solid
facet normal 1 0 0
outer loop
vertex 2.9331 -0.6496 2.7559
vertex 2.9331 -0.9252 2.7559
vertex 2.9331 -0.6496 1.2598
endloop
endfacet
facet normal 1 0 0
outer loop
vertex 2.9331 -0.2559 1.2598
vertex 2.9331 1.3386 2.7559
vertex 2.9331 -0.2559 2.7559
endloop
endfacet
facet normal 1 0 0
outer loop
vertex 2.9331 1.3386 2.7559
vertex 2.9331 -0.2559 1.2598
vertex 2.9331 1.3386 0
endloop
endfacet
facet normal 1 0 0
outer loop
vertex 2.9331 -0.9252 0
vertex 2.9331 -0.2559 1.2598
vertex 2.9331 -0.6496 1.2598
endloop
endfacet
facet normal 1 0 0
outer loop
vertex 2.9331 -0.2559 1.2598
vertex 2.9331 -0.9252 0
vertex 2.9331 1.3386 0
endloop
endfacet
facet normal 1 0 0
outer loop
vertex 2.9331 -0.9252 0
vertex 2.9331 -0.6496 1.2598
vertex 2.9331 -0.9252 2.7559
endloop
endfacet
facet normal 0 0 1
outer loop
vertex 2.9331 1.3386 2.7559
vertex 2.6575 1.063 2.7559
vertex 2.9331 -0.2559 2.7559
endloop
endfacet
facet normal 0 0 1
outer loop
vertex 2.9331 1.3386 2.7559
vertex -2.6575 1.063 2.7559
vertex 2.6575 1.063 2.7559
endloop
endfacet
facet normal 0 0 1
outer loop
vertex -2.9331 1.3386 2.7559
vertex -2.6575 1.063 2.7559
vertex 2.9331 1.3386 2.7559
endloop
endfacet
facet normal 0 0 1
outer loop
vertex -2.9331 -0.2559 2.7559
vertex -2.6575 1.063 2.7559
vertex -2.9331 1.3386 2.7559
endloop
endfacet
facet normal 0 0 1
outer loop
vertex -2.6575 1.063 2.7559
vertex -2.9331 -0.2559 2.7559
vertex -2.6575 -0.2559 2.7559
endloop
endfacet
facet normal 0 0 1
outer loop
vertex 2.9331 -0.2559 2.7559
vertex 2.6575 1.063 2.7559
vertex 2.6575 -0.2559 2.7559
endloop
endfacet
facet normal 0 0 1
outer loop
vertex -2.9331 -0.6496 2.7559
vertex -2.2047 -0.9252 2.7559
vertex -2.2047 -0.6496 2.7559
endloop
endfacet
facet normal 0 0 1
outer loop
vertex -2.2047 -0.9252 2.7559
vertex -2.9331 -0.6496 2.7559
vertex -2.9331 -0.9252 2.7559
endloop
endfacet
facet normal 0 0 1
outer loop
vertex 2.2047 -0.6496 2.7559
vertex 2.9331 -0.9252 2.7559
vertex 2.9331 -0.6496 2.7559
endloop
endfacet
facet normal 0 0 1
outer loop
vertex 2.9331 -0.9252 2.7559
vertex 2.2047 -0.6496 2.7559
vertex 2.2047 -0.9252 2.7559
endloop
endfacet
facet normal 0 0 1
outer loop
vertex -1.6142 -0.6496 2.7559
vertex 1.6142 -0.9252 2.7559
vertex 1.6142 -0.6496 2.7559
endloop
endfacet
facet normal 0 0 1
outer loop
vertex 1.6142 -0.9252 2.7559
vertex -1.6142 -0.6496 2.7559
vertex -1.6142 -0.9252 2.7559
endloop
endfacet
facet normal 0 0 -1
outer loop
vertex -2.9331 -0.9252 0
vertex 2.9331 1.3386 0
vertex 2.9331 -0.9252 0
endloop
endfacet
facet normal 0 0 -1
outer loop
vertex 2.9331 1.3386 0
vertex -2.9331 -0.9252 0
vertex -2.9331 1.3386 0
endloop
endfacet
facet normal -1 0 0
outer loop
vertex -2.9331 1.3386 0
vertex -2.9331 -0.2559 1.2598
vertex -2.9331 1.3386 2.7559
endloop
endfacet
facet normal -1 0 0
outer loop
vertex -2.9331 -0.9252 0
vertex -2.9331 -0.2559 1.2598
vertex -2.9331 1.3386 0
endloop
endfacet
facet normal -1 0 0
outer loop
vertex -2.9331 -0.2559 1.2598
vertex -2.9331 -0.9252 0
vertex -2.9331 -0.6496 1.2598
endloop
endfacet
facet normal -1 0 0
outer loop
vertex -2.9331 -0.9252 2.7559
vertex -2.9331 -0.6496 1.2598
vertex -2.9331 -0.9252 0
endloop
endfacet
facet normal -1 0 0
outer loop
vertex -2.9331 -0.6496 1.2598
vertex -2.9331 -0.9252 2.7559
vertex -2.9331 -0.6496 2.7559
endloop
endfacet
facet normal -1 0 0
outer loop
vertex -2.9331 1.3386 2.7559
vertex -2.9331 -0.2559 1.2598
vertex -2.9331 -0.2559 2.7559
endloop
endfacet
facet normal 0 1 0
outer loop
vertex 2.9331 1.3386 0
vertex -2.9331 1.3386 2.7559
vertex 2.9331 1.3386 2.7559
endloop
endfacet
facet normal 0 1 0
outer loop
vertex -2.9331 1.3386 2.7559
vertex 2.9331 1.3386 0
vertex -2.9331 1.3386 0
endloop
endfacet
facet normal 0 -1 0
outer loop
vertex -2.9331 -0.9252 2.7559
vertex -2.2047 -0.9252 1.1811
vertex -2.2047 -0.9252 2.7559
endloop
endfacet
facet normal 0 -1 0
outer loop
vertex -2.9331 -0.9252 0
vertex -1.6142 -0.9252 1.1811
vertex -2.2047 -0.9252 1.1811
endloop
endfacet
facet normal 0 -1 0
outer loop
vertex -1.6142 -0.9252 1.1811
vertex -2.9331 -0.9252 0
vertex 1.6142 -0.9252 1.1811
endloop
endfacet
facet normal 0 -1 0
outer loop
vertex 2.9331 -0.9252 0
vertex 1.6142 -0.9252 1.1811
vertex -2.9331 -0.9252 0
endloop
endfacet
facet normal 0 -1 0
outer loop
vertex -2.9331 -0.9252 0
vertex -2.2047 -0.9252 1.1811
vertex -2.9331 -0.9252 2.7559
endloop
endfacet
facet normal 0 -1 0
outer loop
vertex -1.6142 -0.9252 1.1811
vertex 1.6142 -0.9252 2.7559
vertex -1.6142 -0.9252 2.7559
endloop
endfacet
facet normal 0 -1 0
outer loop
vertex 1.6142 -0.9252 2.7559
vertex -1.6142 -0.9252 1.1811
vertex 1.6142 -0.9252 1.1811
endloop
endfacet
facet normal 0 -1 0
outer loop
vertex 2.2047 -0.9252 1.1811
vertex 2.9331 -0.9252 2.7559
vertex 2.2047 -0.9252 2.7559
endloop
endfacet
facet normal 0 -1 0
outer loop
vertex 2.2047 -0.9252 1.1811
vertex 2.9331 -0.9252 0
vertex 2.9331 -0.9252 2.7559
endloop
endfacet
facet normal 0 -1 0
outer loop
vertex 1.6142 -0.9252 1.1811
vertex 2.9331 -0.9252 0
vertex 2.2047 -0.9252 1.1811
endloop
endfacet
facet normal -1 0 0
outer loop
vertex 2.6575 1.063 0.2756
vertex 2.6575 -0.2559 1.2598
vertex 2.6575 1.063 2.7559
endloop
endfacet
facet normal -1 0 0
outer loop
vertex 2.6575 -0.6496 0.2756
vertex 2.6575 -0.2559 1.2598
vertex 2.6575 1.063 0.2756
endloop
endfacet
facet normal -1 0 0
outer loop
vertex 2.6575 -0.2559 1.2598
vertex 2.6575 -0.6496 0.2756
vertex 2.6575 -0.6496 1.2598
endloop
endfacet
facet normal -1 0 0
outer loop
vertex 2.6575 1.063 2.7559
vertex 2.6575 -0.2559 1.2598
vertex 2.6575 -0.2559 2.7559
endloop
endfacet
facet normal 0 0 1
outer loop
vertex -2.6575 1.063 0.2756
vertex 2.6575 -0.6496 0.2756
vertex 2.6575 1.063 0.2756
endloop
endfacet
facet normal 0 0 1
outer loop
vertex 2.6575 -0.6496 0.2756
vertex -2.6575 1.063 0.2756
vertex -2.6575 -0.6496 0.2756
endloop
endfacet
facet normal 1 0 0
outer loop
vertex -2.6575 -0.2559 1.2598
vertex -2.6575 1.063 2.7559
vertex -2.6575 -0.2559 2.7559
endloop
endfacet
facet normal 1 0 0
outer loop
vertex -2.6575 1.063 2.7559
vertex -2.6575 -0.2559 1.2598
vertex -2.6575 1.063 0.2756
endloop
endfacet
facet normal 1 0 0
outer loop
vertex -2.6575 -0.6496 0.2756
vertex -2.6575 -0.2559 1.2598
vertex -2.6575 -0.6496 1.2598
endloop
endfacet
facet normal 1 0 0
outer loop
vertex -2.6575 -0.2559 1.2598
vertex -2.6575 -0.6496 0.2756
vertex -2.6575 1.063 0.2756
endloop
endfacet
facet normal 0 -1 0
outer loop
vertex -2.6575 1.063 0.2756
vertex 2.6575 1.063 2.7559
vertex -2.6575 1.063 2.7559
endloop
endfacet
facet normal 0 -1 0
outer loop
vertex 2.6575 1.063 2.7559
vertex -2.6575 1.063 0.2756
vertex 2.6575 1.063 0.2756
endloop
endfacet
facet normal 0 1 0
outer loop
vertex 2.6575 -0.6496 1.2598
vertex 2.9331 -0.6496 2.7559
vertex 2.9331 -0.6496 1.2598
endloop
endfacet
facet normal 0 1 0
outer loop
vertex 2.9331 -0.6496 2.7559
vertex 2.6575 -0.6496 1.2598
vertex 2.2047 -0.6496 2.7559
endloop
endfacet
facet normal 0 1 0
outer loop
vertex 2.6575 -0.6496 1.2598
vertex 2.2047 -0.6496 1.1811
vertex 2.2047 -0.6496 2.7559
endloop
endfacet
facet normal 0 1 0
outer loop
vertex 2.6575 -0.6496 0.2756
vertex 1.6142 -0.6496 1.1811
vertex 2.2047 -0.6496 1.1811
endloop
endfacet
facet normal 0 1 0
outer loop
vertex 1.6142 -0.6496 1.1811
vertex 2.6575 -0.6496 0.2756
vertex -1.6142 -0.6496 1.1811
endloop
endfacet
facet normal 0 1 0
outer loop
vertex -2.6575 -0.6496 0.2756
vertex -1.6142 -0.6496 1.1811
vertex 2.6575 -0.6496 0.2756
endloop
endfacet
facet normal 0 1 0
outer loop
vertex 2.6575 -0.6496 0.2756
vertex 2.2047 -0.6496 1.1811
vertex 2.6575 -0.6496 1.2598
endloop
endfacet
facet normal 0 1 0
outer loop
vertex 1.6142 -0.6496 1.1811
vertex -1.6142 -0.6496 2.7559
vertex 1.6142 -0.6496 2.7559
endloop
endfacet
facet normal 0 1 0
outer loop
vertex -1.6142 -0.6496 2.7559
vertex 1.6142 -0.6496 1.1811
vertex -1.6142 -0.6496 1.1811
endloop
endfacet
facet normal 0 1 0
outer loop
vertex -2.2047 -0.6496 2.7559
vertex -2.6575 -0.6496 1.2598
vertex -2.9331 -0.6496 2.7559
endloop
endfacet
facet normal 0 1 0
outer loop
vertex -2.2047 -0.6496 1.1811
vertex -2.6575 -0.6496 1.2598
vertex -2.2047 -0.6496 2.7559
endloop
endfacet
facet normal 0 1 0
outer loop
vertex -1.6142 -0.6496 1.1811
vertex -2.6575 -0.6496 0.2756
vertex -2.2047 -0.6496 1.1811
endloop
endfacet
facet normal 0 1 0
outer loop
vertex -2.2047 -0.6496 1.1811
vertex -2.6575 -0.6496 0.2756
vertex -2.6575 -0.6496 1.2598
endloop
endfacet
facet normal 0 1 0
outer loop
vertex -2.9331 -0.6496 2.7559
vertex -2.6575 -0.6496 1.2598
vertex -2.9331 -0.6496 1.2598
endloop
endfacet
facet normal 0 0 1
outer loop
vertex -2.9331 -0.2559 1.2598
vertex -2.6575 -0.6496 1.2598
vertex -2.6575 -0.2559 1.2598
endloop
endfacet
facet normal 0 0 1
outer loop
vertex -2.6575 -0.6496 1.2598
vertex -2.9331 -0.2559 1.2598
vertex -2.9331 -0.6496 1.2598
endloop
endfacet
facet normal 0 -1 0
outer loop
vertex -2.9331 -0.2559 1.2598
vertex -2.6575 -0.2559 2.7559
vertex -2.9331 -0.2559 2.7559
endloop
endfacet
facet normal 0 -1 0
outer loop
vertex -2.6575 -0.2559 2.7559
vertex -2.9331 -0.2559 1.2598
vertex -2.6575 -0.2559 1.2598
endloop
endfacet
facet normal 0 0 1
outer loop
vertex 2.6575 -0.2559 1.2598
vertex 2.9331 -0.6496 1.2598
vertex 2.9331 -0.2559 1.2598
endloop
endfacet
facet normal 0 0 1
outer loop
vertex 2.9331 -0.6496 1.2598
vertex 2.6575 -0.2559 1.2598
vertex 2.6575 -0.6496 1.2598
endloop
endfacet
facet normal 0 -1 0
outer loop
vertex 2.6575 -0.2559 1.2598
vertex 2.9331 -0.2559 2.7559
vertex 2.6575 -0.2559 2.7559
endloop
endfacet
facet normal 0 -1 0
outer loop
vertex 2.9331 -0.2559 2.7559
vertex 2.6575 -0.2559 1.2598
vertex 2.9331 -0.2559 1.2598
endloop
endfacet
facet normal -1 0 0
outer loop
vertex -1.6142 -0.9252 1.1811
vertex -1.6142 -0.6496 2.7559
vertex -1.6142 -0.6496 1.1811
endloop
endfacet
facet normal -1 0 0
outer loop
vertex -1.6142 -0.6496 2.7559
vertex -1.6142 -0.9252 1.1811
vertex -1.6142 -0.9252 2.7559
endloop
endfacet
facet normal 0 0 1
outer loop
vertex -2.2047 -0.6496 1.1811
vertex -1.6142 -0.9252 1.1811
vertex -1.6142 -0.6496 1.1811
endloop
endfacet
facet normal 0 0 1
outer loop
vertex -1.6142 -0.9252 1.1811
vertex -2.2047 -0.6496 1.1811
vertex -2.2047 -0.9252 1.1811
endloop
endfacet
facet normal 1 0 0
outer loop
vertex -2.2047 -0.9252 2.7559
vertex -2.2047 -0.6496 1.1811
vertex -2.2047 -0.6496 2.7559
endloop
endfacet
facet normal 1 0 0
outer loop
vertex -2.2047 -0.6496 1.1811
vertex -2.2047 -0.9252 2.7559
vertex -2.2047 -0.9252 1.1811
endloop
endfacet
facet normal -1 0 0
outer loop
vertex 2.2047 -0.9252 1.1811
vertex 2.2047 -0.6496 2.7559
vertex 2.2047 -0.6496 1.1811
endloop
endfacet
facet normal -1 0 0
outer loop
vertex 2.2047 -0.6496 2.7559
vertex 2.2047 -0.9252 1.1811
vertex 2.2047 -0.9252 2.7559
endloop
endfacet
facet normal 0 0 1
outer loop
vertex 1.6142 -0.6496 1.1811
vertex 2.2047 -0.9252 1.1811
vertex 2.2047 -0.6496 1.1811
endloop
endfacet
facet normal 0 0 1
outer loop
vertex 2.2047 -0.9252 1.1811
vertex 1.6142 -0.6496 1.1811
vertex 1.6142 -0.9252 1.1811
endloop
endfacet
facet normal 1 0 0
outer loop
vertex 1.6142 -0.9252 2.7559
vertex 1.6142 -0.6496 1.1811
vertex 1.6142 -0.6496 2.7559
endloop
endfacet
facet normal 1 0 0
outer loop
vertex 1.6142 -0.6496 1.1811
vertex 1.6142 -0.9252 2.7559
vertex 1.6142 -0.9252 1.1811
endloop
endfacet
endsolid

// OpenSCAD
// file: defines.scad
// example012.stl is Mblock.stl, (c) 2009 Will Langford
// licensed under the Creative Commons - GNU GPL license.
// http://www.thingiverse.com/thing:753

//import("sim800c.stl", convexity=3);

// PCB

A = 2.5;
B = 14.9;

scale = 1/2.54;
// main file
include <defines.scad>

W = 5.75;
W_O = 2.35;
H = 7.0;

th = 0.7; // Walls

scale(scale) color("White") {

difference() {
// Base

  translate([-B/2, -W_O, 0])
    cube(size = [B, W, H], center = false);

  translate([-B/2 + th, -W_O + th, th])
    cube(size = [B - th*2, W - th*2, H], center = false);

    translate([-B/2-1 , -W_O + th, H-3.8])
      cube(size = [2, 1, 3.9], center = false);

    translate([ B/2-1 , -W_O + th, H-3.8])
      cube(size = [2, 1, 3.9], center = false);

    translate([ -4.1-1.5, -W_O - 1, H-4.0])
      cube(size = [1.5, 2, 4.1], center = false);

    translate([ 4.1, -W_O - 1, H-4.0])
      cube(size = [1.5, 2, 4.1], center = false);
}


}
